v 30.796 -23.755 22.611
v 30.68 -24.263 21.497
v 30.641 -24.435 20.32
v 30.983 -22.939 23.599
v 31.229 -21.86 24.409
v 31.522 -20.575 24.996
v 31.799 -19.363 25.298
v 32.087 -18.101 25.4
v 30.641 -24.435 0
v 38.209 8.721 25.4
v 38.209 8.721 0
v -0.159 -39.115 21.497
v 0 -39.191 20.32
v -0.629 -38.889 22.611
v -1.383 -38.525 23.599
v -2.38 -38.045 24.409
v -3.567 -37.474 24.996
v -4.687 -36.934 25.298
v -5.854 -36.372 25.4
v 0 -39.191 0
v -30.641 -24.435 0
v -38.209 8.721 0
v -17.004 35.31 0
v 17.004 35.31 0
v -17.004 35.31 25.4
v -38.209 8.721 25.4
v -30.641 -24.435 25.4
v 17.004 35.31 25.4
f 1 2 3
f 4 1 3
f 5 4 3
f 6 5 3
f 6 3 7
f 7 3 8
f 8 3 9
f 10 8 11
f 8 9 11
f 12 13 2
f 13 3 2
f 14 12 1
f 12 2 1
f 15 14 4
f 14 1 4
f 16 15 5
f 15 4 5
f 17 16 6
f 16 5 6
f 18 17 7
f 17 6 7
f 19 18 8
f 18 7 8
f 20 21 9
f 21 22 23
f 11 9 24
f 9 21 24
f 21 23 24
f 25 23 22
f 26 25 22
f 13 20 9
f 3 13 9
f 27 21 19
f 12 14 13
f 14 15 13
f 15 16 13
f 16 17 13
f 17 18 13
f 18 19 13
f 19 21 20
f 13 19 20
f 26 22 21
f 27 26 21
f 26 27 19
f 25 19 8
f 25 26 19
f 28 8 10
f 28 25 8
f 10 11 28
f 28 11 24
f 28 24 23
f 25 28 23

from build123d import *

# Parameters (mm, degrees)
F1_DEPTH = 25.4
F2_R     = 5.08


with BuildPart() as f1:
    # F0 (on Top) → F1 (new body)
    with BuildSketch(Plane.XY):
        Polygon((17.004497, 35.310201), (-17.004497, 35.310201), (-38.208757, 8.7209), (-30.641044, -24.435417), (0, -39.191367), (30.641044, -24.435417), (38.208757, 8.7209), align=None)
    extrude(amount=F1_DEPTH)

    # F2
    f2_edges = [f1.edges().sort_by_distance(p)[0] for p in [
        (15.320522, -31.813392, 25.4),
    ]]
    fillet(f2_edges, radius=F2_R)


solid = f1.part
